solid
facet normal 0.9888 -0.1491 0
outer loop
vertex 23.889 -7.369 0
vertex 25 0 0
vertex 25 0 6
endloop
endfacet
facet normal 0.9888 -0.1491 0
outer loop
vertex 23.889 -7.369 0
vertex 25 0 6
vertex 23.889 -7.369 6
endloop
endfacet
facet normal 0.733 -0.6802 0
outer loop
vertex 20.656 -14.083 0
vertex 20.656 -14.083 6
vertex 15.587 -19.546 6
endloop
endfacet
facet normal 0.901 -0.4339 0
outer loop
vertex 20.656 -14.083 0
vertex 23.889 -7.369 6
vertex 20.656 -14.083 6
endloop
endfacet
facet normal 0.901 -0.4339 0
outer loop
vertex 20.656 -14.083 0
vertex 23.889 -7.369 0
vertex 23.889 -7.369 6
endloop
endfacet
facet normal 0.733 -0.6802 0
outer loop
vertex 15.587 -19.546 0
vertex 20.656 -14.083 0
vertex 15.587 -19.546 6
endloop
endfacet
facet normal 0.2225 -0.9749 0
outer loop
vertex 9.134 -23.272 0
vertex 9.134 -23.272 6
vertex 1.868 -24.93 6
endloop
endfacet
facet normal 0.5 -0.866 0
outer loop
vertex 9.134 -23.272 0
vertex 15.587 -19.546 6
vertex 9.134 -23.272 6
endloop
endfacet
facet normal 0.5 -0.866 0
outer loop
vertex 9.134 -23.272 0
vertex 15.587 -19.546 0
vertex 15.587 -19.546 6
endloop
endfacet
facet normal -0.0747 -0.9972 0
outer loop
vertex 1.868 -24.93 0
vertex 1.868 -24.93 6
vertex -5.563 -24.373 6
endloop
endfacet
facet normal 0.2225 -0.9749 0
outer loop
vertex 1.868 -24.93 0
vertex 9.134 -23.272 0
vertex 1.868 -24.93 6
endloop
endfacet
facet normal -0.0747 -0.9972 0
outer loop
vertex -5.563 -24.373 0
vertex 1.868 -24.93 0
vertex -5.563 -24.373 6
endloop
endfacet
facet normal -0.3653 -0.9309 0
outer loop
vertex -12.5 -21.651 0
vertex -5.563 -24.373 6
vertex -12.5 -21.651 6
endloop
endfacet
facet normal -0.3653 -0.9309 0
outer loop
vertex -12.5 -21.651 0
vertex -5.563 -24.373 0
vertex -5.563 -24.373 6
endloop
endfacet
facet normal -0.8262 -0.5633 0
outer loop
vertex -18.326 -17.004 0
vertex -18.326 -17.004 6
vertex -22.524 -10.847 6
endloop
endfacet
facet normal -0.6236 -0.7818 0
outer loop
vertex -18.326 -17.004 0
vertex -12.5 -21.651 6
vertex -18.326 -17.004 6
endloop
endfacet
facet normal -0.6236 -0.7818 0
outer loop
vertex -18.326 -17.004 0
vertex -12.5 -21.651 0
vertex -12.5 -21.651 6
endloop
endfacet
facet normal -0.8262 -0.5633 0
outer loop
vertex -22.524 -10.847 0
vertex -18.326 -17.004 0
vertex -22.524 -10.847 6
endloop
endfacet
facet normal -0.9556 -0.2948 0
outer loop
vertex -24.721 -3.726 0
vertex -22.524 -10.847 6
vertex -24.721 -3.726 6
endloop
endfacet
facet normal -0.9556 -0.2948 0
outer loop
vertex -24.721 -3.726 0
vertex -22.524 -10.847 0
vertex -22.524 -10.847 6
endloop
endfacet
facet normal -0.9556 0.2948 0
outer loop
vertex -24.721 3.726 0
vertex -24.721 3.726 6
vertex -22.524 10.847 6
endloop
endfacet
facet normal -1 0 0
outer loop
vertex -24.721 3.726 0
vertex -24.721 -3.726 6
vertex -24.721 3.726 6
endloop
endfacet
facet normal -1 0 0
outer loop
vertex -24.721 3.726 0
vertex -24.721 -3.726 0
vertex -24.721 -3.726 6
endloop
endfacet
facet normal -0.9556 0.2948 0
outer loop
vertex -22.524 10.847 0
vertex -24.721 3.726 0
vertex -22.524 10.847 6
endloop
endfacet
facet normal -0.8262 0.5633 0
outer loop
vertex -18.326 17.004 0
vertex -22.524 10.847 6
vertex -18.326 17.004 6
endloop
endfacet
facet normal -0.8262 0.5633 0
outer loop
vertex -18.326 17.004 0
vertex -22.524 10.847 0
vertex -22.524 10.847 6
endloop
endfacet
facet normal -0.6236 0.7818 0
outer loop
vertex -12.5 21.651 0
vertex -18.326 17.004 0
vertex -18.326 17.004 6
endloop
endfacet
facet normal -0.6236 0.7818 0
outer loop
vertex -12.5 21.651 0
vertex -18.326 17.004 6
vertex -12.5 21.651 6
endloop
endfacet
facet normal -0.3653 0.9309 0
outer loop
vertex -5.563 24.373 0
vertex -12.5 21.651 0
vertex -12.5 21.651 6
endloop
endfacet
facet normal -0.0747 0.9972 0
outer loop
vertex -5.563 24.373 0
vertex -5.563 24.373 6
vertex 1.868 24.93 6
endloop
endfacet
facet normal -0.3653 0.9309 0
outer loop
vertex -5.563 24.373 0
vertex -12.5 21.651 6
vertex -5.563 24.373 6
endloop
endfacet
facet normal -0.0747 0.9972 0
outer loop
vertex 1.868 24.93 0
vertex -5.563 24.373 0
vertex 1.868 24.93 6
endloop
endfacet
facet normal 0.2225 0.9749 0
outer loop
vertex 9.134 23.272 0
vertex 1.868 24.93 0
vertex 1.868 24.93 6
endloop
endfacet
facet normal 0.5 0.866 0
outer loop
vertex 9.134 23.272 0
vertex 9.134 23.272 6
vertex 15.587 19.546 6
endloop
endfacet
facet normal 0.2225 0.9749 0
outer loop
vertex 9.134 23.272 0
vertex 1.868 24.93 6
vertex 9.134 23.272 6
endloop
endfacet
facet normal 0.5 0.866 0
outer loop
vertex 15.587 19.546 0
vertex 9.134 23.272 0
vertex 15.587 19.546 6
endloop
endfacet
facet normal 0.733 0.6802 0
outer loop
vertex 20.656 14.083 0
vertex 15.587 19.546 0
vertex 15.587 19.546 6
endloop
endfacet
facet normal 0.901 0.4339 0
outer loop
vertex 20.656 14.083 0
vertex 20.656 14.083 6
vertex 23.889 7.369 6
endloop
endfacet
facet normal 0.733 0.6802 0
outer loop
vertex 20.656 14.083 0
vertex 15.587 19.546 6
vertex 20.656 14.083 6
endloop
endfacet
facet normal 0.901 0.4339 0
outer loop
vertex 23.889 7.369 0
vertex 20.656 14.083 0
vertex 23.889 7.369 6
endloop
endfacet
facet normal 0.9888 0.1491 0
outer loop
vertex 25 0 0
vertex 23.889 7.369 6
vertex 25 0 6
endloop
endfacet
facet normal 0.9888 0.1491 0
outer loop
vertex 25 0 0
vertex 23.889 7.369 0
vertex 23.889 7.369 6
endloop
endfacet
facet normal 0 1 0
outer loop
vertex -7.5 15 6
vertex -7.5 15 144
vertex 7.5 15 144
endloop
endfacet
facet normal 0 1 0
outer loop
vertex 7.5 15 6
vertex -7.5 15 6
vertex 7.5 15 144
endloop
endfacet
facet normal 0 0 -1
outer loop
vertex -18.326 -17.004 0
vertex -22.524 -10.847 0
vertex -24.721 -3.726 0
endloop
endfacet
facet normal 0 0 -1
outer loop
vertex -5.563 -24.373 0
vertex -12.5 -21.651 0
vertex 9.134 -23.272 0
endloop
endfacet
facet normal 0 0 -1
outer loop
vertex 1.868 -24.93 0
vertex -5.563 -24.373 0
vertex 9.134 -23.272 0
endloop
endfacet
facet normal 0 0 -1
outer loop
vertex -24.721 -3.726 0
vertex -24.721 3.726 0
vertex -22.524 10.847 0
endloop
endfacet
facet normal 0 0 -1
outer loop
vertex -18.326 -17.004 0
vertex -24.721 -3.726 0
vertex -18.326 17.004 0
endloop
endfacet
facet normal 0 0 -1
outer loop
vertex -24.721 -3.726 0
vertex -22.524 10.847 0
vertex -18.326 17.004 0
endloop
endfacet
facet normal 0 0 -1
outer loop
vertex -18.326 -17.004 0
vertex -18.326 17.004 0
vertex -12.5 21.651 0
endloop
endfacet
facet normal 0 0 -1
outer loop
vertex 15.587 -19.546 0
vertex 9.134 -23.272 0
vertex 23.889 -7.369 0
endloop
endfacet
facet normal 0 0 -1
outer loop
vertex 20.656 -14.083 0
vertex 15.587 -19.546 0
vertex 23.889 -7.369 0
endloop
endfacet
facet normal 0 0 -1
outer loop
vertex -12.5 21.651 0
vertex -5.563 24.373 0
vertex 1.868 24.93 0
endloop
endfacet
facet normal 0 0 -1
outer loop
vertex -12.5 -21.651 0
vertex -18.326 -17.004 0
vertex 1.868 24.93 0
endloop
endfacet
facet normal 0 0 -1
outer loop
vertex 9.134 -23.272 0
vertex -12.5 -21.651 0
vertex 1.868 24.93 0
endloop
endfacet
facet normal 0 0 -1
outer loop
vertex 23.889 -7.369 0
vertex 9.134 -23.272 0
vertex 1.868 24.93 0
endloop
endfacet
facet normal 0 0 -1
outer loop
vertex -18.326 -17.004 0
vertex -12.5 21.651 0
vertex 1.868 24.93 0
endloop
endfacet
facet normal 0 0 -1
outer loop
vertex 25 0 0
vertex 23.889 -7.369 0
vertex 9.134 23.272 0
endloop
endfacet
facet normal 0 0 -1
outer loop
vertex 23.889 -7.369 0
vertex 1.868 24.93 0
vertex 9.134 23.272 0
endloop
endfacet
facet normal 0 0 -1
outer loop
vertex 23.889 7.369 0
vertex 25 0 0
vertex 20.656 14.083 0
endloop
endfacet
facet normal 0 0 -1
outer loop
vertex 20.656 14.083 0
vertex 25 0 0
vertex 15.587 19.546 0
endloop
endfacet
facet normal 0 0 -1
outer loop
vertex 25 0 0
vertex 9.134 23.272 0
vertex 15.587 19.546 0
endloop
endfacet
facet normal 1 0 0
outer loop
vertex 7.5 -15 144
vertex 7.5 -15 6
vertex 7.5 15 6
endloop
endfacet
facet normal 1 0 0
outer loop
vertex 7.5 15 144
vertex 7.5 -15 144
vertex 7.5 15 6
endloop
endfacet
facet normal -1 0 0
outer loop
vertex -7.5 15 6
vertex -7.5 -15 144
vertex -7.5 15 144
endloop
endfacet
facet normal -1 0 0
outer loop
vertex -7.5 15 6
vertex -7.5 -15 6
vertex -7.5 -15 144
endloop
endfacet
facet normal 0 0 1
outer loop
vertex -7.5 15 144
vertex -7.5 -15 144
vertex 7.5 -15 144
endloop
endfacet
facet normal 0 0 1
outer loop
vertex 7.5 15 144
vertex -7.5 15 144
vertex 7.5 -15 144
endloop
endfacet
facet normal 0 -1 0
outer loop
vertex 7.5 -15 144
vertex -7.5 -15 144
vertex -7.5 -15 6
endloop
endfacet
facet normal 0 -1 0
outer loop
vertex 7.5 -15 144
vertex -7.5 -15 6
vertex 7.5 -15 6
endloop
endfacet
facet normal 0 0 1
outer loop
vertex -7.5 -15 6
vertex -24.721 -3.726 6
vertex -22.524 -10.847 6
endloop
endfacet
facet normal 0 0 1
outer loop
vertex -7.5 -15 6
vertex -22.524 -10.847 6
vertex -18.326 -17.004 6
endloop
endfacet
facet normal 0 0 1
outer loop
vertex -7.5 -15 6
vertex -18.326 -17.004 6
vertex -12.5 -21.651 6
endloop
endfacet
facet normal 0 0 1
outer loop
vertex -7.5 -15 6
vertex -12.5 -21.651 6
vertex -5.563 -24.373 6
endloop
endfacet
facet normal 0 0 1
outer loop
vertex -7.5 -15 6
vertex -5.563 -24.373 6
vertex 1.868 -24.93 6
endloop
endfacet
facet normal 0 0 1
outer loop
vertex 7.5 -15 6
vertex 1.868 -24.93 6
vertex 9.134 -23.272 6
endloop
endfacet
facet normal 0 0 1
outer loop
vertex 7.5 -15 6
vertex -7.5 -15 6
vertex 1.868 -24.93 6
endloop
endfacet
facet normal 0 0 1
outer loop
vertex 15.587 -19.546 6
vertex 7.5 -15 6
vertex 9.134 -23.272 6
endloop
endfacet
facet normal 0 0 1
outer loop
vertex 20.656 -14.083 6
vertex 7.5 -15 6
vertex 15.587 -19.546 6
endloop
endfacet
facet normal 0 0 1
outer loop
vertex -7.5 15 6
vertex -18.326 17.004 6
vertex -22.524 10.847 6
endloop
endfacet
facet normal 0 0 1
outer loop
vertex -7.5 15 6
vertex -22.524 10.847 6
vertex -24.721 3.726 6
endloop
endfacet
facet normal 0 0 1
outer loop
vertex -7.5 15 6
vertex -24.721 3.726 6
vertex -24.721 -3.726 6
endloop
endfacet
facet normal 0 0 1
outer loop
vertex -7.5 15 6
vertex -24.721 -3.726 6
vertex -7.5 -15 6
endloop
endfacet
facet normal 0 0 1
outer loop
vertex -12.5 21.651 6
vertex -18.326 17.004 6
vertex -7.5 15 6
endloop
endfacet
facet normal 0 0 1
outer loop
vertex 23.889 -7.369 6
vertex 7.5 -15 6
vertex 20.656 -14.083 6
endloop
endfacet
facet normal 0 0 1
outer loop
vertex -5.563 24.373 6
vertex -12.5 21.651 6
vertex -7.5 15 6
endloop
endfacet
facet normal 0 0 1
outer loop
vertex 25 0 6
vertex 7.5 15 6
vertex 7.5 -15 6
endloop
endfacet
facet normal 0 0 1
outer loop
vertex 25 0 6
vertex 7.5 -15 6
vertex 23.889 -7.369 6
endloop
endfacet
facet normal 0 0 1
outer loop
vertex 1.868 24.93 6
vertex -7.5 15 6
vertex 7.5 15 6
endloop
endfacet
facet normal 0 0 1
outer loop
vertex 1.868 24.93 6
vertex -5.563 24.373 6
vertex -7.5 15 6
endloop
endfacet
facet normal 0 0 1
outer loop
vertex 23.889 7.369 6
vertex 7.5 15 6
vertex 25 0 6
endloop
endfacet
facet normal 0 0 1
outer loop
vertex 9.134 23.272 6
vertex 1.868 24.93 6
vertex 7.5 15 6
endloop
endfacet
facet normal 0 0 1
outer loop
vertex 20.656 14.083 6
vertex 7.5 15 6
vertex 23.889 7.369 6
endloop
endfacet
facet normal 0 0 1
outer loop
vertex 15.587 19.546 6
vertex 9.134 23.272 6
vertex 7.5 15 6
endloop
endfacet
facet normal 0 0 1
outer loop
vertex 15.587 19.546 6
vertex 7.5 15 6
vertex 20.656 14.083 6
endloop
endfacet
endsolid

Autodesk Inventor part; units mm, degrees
ref_plane "YZ Plane" through (0, 0, 0) normal (1, 0, 0) x (0, 1, 0)
ref_plane "XZ Plane" through (0, 0, 0) normal (0, 1, 0) x (-1, 0, 0)
ref_plane "XY Plane" through (0, 0, 0) normal (0, 0, 1) x (1, 0, 0)
sketch "スケッチ1" plane through (0, 0, 0) normal (0, 0, 1) x (1, 0, 0)
  circle A0 centre (0, 0) radius 25
  dimension "d0" = 50
extrude "押し出し1" add sketch "スケッチ1" along normal blind 6
sketch "スケッチ2" plane through (0, 0, 6) normal (0, 0, 1) x (1, 0, 0)
  line L0 (-7.5, 15) -> (7.5, 15)
  line L1 (7.5, 15) -> (7.5, -15)
  line L2 (7.5, -15) -> (-7.5, -15)
  line L3 (-7.5, -15) -> (-7.5, 15)
  circle A0 centre (0, 0) radius 25 projected
  dimension "d3" = 15
  dimension "d4" = 30
  dimension "d5" = 7.5
  dimension "d6" = 15
extrude "押し出し2" add sketch "スケッチ2" along normal blind 100 contours L0 L1 L2 L3
sketch "スケッチ3" plane through (0, 0, 106) normal (0, 0, 1) x (1, 0, 0)
  circle A0 centre (0, 0) radius 25
  dimension "d9" = 50
extrude "押し出し3" cut sketch "スケッチ3" against normal blind 6
sketch "スケッチ4" plane through (0, 0, 100) normal (0, 0, 1) x (1, 0, 0)
  circle A0 centre (0, 0) radius 25
  dimension "d12" = 50
extrude "押し出し4" add sketch "スケッチ4" along normal blind 6
sketch "スケッチ5" plane through (0, 0, 106) normal (0, 0, 1) x (1, 0, 0)
  circle A0 centre (0, 0) radius 25
  dimension "d15" = 50
extrude "押し出し5" cut sketch "スケッチ5" against normal blind 6
sketch "スケッチ6" plane through (0, 0, 100) normal (0, 0, 1) x (1, 0, 0)
  line L0 (-7.5, -15) -> (-7.5, 15) projected
  line L1 (-7.5, 15) -> (7.5, 15) projected
  line L2 (-7.5, -15) -> (7.5, -15)
  line L3 (7.5, -15) -> (7.5, 15)
  line L4 (7.5, 15) -> (-7.5, 15)
  line L5 (-7.5, 15) -> (-7.5, -15)
  point P0 (0, 0)
extrude "押し出し6" add sketch "スケッチ6" along normal blind 44
sketch "スケッチ7" plane through (0, 0, 144) normal (0, 0, 1) x (1, 0, 0)
  circle A0 centre (0, 0) radius 25
  dimension "d20" = 50
extrude "押し出し7" add sketch "スケッチ7" along normal blind 6
sketch "スケッチ8" plane through (0, 0, 150) normal (0, 0, 1) x (1, 0, 0)
  circle A0 centre (0, 0) radius 25
  dimension "d23" = 50
extrude "押し出し8" cut sketch "スケッチ8" against normal blind 6
properties part number "NHK_t0_5"
